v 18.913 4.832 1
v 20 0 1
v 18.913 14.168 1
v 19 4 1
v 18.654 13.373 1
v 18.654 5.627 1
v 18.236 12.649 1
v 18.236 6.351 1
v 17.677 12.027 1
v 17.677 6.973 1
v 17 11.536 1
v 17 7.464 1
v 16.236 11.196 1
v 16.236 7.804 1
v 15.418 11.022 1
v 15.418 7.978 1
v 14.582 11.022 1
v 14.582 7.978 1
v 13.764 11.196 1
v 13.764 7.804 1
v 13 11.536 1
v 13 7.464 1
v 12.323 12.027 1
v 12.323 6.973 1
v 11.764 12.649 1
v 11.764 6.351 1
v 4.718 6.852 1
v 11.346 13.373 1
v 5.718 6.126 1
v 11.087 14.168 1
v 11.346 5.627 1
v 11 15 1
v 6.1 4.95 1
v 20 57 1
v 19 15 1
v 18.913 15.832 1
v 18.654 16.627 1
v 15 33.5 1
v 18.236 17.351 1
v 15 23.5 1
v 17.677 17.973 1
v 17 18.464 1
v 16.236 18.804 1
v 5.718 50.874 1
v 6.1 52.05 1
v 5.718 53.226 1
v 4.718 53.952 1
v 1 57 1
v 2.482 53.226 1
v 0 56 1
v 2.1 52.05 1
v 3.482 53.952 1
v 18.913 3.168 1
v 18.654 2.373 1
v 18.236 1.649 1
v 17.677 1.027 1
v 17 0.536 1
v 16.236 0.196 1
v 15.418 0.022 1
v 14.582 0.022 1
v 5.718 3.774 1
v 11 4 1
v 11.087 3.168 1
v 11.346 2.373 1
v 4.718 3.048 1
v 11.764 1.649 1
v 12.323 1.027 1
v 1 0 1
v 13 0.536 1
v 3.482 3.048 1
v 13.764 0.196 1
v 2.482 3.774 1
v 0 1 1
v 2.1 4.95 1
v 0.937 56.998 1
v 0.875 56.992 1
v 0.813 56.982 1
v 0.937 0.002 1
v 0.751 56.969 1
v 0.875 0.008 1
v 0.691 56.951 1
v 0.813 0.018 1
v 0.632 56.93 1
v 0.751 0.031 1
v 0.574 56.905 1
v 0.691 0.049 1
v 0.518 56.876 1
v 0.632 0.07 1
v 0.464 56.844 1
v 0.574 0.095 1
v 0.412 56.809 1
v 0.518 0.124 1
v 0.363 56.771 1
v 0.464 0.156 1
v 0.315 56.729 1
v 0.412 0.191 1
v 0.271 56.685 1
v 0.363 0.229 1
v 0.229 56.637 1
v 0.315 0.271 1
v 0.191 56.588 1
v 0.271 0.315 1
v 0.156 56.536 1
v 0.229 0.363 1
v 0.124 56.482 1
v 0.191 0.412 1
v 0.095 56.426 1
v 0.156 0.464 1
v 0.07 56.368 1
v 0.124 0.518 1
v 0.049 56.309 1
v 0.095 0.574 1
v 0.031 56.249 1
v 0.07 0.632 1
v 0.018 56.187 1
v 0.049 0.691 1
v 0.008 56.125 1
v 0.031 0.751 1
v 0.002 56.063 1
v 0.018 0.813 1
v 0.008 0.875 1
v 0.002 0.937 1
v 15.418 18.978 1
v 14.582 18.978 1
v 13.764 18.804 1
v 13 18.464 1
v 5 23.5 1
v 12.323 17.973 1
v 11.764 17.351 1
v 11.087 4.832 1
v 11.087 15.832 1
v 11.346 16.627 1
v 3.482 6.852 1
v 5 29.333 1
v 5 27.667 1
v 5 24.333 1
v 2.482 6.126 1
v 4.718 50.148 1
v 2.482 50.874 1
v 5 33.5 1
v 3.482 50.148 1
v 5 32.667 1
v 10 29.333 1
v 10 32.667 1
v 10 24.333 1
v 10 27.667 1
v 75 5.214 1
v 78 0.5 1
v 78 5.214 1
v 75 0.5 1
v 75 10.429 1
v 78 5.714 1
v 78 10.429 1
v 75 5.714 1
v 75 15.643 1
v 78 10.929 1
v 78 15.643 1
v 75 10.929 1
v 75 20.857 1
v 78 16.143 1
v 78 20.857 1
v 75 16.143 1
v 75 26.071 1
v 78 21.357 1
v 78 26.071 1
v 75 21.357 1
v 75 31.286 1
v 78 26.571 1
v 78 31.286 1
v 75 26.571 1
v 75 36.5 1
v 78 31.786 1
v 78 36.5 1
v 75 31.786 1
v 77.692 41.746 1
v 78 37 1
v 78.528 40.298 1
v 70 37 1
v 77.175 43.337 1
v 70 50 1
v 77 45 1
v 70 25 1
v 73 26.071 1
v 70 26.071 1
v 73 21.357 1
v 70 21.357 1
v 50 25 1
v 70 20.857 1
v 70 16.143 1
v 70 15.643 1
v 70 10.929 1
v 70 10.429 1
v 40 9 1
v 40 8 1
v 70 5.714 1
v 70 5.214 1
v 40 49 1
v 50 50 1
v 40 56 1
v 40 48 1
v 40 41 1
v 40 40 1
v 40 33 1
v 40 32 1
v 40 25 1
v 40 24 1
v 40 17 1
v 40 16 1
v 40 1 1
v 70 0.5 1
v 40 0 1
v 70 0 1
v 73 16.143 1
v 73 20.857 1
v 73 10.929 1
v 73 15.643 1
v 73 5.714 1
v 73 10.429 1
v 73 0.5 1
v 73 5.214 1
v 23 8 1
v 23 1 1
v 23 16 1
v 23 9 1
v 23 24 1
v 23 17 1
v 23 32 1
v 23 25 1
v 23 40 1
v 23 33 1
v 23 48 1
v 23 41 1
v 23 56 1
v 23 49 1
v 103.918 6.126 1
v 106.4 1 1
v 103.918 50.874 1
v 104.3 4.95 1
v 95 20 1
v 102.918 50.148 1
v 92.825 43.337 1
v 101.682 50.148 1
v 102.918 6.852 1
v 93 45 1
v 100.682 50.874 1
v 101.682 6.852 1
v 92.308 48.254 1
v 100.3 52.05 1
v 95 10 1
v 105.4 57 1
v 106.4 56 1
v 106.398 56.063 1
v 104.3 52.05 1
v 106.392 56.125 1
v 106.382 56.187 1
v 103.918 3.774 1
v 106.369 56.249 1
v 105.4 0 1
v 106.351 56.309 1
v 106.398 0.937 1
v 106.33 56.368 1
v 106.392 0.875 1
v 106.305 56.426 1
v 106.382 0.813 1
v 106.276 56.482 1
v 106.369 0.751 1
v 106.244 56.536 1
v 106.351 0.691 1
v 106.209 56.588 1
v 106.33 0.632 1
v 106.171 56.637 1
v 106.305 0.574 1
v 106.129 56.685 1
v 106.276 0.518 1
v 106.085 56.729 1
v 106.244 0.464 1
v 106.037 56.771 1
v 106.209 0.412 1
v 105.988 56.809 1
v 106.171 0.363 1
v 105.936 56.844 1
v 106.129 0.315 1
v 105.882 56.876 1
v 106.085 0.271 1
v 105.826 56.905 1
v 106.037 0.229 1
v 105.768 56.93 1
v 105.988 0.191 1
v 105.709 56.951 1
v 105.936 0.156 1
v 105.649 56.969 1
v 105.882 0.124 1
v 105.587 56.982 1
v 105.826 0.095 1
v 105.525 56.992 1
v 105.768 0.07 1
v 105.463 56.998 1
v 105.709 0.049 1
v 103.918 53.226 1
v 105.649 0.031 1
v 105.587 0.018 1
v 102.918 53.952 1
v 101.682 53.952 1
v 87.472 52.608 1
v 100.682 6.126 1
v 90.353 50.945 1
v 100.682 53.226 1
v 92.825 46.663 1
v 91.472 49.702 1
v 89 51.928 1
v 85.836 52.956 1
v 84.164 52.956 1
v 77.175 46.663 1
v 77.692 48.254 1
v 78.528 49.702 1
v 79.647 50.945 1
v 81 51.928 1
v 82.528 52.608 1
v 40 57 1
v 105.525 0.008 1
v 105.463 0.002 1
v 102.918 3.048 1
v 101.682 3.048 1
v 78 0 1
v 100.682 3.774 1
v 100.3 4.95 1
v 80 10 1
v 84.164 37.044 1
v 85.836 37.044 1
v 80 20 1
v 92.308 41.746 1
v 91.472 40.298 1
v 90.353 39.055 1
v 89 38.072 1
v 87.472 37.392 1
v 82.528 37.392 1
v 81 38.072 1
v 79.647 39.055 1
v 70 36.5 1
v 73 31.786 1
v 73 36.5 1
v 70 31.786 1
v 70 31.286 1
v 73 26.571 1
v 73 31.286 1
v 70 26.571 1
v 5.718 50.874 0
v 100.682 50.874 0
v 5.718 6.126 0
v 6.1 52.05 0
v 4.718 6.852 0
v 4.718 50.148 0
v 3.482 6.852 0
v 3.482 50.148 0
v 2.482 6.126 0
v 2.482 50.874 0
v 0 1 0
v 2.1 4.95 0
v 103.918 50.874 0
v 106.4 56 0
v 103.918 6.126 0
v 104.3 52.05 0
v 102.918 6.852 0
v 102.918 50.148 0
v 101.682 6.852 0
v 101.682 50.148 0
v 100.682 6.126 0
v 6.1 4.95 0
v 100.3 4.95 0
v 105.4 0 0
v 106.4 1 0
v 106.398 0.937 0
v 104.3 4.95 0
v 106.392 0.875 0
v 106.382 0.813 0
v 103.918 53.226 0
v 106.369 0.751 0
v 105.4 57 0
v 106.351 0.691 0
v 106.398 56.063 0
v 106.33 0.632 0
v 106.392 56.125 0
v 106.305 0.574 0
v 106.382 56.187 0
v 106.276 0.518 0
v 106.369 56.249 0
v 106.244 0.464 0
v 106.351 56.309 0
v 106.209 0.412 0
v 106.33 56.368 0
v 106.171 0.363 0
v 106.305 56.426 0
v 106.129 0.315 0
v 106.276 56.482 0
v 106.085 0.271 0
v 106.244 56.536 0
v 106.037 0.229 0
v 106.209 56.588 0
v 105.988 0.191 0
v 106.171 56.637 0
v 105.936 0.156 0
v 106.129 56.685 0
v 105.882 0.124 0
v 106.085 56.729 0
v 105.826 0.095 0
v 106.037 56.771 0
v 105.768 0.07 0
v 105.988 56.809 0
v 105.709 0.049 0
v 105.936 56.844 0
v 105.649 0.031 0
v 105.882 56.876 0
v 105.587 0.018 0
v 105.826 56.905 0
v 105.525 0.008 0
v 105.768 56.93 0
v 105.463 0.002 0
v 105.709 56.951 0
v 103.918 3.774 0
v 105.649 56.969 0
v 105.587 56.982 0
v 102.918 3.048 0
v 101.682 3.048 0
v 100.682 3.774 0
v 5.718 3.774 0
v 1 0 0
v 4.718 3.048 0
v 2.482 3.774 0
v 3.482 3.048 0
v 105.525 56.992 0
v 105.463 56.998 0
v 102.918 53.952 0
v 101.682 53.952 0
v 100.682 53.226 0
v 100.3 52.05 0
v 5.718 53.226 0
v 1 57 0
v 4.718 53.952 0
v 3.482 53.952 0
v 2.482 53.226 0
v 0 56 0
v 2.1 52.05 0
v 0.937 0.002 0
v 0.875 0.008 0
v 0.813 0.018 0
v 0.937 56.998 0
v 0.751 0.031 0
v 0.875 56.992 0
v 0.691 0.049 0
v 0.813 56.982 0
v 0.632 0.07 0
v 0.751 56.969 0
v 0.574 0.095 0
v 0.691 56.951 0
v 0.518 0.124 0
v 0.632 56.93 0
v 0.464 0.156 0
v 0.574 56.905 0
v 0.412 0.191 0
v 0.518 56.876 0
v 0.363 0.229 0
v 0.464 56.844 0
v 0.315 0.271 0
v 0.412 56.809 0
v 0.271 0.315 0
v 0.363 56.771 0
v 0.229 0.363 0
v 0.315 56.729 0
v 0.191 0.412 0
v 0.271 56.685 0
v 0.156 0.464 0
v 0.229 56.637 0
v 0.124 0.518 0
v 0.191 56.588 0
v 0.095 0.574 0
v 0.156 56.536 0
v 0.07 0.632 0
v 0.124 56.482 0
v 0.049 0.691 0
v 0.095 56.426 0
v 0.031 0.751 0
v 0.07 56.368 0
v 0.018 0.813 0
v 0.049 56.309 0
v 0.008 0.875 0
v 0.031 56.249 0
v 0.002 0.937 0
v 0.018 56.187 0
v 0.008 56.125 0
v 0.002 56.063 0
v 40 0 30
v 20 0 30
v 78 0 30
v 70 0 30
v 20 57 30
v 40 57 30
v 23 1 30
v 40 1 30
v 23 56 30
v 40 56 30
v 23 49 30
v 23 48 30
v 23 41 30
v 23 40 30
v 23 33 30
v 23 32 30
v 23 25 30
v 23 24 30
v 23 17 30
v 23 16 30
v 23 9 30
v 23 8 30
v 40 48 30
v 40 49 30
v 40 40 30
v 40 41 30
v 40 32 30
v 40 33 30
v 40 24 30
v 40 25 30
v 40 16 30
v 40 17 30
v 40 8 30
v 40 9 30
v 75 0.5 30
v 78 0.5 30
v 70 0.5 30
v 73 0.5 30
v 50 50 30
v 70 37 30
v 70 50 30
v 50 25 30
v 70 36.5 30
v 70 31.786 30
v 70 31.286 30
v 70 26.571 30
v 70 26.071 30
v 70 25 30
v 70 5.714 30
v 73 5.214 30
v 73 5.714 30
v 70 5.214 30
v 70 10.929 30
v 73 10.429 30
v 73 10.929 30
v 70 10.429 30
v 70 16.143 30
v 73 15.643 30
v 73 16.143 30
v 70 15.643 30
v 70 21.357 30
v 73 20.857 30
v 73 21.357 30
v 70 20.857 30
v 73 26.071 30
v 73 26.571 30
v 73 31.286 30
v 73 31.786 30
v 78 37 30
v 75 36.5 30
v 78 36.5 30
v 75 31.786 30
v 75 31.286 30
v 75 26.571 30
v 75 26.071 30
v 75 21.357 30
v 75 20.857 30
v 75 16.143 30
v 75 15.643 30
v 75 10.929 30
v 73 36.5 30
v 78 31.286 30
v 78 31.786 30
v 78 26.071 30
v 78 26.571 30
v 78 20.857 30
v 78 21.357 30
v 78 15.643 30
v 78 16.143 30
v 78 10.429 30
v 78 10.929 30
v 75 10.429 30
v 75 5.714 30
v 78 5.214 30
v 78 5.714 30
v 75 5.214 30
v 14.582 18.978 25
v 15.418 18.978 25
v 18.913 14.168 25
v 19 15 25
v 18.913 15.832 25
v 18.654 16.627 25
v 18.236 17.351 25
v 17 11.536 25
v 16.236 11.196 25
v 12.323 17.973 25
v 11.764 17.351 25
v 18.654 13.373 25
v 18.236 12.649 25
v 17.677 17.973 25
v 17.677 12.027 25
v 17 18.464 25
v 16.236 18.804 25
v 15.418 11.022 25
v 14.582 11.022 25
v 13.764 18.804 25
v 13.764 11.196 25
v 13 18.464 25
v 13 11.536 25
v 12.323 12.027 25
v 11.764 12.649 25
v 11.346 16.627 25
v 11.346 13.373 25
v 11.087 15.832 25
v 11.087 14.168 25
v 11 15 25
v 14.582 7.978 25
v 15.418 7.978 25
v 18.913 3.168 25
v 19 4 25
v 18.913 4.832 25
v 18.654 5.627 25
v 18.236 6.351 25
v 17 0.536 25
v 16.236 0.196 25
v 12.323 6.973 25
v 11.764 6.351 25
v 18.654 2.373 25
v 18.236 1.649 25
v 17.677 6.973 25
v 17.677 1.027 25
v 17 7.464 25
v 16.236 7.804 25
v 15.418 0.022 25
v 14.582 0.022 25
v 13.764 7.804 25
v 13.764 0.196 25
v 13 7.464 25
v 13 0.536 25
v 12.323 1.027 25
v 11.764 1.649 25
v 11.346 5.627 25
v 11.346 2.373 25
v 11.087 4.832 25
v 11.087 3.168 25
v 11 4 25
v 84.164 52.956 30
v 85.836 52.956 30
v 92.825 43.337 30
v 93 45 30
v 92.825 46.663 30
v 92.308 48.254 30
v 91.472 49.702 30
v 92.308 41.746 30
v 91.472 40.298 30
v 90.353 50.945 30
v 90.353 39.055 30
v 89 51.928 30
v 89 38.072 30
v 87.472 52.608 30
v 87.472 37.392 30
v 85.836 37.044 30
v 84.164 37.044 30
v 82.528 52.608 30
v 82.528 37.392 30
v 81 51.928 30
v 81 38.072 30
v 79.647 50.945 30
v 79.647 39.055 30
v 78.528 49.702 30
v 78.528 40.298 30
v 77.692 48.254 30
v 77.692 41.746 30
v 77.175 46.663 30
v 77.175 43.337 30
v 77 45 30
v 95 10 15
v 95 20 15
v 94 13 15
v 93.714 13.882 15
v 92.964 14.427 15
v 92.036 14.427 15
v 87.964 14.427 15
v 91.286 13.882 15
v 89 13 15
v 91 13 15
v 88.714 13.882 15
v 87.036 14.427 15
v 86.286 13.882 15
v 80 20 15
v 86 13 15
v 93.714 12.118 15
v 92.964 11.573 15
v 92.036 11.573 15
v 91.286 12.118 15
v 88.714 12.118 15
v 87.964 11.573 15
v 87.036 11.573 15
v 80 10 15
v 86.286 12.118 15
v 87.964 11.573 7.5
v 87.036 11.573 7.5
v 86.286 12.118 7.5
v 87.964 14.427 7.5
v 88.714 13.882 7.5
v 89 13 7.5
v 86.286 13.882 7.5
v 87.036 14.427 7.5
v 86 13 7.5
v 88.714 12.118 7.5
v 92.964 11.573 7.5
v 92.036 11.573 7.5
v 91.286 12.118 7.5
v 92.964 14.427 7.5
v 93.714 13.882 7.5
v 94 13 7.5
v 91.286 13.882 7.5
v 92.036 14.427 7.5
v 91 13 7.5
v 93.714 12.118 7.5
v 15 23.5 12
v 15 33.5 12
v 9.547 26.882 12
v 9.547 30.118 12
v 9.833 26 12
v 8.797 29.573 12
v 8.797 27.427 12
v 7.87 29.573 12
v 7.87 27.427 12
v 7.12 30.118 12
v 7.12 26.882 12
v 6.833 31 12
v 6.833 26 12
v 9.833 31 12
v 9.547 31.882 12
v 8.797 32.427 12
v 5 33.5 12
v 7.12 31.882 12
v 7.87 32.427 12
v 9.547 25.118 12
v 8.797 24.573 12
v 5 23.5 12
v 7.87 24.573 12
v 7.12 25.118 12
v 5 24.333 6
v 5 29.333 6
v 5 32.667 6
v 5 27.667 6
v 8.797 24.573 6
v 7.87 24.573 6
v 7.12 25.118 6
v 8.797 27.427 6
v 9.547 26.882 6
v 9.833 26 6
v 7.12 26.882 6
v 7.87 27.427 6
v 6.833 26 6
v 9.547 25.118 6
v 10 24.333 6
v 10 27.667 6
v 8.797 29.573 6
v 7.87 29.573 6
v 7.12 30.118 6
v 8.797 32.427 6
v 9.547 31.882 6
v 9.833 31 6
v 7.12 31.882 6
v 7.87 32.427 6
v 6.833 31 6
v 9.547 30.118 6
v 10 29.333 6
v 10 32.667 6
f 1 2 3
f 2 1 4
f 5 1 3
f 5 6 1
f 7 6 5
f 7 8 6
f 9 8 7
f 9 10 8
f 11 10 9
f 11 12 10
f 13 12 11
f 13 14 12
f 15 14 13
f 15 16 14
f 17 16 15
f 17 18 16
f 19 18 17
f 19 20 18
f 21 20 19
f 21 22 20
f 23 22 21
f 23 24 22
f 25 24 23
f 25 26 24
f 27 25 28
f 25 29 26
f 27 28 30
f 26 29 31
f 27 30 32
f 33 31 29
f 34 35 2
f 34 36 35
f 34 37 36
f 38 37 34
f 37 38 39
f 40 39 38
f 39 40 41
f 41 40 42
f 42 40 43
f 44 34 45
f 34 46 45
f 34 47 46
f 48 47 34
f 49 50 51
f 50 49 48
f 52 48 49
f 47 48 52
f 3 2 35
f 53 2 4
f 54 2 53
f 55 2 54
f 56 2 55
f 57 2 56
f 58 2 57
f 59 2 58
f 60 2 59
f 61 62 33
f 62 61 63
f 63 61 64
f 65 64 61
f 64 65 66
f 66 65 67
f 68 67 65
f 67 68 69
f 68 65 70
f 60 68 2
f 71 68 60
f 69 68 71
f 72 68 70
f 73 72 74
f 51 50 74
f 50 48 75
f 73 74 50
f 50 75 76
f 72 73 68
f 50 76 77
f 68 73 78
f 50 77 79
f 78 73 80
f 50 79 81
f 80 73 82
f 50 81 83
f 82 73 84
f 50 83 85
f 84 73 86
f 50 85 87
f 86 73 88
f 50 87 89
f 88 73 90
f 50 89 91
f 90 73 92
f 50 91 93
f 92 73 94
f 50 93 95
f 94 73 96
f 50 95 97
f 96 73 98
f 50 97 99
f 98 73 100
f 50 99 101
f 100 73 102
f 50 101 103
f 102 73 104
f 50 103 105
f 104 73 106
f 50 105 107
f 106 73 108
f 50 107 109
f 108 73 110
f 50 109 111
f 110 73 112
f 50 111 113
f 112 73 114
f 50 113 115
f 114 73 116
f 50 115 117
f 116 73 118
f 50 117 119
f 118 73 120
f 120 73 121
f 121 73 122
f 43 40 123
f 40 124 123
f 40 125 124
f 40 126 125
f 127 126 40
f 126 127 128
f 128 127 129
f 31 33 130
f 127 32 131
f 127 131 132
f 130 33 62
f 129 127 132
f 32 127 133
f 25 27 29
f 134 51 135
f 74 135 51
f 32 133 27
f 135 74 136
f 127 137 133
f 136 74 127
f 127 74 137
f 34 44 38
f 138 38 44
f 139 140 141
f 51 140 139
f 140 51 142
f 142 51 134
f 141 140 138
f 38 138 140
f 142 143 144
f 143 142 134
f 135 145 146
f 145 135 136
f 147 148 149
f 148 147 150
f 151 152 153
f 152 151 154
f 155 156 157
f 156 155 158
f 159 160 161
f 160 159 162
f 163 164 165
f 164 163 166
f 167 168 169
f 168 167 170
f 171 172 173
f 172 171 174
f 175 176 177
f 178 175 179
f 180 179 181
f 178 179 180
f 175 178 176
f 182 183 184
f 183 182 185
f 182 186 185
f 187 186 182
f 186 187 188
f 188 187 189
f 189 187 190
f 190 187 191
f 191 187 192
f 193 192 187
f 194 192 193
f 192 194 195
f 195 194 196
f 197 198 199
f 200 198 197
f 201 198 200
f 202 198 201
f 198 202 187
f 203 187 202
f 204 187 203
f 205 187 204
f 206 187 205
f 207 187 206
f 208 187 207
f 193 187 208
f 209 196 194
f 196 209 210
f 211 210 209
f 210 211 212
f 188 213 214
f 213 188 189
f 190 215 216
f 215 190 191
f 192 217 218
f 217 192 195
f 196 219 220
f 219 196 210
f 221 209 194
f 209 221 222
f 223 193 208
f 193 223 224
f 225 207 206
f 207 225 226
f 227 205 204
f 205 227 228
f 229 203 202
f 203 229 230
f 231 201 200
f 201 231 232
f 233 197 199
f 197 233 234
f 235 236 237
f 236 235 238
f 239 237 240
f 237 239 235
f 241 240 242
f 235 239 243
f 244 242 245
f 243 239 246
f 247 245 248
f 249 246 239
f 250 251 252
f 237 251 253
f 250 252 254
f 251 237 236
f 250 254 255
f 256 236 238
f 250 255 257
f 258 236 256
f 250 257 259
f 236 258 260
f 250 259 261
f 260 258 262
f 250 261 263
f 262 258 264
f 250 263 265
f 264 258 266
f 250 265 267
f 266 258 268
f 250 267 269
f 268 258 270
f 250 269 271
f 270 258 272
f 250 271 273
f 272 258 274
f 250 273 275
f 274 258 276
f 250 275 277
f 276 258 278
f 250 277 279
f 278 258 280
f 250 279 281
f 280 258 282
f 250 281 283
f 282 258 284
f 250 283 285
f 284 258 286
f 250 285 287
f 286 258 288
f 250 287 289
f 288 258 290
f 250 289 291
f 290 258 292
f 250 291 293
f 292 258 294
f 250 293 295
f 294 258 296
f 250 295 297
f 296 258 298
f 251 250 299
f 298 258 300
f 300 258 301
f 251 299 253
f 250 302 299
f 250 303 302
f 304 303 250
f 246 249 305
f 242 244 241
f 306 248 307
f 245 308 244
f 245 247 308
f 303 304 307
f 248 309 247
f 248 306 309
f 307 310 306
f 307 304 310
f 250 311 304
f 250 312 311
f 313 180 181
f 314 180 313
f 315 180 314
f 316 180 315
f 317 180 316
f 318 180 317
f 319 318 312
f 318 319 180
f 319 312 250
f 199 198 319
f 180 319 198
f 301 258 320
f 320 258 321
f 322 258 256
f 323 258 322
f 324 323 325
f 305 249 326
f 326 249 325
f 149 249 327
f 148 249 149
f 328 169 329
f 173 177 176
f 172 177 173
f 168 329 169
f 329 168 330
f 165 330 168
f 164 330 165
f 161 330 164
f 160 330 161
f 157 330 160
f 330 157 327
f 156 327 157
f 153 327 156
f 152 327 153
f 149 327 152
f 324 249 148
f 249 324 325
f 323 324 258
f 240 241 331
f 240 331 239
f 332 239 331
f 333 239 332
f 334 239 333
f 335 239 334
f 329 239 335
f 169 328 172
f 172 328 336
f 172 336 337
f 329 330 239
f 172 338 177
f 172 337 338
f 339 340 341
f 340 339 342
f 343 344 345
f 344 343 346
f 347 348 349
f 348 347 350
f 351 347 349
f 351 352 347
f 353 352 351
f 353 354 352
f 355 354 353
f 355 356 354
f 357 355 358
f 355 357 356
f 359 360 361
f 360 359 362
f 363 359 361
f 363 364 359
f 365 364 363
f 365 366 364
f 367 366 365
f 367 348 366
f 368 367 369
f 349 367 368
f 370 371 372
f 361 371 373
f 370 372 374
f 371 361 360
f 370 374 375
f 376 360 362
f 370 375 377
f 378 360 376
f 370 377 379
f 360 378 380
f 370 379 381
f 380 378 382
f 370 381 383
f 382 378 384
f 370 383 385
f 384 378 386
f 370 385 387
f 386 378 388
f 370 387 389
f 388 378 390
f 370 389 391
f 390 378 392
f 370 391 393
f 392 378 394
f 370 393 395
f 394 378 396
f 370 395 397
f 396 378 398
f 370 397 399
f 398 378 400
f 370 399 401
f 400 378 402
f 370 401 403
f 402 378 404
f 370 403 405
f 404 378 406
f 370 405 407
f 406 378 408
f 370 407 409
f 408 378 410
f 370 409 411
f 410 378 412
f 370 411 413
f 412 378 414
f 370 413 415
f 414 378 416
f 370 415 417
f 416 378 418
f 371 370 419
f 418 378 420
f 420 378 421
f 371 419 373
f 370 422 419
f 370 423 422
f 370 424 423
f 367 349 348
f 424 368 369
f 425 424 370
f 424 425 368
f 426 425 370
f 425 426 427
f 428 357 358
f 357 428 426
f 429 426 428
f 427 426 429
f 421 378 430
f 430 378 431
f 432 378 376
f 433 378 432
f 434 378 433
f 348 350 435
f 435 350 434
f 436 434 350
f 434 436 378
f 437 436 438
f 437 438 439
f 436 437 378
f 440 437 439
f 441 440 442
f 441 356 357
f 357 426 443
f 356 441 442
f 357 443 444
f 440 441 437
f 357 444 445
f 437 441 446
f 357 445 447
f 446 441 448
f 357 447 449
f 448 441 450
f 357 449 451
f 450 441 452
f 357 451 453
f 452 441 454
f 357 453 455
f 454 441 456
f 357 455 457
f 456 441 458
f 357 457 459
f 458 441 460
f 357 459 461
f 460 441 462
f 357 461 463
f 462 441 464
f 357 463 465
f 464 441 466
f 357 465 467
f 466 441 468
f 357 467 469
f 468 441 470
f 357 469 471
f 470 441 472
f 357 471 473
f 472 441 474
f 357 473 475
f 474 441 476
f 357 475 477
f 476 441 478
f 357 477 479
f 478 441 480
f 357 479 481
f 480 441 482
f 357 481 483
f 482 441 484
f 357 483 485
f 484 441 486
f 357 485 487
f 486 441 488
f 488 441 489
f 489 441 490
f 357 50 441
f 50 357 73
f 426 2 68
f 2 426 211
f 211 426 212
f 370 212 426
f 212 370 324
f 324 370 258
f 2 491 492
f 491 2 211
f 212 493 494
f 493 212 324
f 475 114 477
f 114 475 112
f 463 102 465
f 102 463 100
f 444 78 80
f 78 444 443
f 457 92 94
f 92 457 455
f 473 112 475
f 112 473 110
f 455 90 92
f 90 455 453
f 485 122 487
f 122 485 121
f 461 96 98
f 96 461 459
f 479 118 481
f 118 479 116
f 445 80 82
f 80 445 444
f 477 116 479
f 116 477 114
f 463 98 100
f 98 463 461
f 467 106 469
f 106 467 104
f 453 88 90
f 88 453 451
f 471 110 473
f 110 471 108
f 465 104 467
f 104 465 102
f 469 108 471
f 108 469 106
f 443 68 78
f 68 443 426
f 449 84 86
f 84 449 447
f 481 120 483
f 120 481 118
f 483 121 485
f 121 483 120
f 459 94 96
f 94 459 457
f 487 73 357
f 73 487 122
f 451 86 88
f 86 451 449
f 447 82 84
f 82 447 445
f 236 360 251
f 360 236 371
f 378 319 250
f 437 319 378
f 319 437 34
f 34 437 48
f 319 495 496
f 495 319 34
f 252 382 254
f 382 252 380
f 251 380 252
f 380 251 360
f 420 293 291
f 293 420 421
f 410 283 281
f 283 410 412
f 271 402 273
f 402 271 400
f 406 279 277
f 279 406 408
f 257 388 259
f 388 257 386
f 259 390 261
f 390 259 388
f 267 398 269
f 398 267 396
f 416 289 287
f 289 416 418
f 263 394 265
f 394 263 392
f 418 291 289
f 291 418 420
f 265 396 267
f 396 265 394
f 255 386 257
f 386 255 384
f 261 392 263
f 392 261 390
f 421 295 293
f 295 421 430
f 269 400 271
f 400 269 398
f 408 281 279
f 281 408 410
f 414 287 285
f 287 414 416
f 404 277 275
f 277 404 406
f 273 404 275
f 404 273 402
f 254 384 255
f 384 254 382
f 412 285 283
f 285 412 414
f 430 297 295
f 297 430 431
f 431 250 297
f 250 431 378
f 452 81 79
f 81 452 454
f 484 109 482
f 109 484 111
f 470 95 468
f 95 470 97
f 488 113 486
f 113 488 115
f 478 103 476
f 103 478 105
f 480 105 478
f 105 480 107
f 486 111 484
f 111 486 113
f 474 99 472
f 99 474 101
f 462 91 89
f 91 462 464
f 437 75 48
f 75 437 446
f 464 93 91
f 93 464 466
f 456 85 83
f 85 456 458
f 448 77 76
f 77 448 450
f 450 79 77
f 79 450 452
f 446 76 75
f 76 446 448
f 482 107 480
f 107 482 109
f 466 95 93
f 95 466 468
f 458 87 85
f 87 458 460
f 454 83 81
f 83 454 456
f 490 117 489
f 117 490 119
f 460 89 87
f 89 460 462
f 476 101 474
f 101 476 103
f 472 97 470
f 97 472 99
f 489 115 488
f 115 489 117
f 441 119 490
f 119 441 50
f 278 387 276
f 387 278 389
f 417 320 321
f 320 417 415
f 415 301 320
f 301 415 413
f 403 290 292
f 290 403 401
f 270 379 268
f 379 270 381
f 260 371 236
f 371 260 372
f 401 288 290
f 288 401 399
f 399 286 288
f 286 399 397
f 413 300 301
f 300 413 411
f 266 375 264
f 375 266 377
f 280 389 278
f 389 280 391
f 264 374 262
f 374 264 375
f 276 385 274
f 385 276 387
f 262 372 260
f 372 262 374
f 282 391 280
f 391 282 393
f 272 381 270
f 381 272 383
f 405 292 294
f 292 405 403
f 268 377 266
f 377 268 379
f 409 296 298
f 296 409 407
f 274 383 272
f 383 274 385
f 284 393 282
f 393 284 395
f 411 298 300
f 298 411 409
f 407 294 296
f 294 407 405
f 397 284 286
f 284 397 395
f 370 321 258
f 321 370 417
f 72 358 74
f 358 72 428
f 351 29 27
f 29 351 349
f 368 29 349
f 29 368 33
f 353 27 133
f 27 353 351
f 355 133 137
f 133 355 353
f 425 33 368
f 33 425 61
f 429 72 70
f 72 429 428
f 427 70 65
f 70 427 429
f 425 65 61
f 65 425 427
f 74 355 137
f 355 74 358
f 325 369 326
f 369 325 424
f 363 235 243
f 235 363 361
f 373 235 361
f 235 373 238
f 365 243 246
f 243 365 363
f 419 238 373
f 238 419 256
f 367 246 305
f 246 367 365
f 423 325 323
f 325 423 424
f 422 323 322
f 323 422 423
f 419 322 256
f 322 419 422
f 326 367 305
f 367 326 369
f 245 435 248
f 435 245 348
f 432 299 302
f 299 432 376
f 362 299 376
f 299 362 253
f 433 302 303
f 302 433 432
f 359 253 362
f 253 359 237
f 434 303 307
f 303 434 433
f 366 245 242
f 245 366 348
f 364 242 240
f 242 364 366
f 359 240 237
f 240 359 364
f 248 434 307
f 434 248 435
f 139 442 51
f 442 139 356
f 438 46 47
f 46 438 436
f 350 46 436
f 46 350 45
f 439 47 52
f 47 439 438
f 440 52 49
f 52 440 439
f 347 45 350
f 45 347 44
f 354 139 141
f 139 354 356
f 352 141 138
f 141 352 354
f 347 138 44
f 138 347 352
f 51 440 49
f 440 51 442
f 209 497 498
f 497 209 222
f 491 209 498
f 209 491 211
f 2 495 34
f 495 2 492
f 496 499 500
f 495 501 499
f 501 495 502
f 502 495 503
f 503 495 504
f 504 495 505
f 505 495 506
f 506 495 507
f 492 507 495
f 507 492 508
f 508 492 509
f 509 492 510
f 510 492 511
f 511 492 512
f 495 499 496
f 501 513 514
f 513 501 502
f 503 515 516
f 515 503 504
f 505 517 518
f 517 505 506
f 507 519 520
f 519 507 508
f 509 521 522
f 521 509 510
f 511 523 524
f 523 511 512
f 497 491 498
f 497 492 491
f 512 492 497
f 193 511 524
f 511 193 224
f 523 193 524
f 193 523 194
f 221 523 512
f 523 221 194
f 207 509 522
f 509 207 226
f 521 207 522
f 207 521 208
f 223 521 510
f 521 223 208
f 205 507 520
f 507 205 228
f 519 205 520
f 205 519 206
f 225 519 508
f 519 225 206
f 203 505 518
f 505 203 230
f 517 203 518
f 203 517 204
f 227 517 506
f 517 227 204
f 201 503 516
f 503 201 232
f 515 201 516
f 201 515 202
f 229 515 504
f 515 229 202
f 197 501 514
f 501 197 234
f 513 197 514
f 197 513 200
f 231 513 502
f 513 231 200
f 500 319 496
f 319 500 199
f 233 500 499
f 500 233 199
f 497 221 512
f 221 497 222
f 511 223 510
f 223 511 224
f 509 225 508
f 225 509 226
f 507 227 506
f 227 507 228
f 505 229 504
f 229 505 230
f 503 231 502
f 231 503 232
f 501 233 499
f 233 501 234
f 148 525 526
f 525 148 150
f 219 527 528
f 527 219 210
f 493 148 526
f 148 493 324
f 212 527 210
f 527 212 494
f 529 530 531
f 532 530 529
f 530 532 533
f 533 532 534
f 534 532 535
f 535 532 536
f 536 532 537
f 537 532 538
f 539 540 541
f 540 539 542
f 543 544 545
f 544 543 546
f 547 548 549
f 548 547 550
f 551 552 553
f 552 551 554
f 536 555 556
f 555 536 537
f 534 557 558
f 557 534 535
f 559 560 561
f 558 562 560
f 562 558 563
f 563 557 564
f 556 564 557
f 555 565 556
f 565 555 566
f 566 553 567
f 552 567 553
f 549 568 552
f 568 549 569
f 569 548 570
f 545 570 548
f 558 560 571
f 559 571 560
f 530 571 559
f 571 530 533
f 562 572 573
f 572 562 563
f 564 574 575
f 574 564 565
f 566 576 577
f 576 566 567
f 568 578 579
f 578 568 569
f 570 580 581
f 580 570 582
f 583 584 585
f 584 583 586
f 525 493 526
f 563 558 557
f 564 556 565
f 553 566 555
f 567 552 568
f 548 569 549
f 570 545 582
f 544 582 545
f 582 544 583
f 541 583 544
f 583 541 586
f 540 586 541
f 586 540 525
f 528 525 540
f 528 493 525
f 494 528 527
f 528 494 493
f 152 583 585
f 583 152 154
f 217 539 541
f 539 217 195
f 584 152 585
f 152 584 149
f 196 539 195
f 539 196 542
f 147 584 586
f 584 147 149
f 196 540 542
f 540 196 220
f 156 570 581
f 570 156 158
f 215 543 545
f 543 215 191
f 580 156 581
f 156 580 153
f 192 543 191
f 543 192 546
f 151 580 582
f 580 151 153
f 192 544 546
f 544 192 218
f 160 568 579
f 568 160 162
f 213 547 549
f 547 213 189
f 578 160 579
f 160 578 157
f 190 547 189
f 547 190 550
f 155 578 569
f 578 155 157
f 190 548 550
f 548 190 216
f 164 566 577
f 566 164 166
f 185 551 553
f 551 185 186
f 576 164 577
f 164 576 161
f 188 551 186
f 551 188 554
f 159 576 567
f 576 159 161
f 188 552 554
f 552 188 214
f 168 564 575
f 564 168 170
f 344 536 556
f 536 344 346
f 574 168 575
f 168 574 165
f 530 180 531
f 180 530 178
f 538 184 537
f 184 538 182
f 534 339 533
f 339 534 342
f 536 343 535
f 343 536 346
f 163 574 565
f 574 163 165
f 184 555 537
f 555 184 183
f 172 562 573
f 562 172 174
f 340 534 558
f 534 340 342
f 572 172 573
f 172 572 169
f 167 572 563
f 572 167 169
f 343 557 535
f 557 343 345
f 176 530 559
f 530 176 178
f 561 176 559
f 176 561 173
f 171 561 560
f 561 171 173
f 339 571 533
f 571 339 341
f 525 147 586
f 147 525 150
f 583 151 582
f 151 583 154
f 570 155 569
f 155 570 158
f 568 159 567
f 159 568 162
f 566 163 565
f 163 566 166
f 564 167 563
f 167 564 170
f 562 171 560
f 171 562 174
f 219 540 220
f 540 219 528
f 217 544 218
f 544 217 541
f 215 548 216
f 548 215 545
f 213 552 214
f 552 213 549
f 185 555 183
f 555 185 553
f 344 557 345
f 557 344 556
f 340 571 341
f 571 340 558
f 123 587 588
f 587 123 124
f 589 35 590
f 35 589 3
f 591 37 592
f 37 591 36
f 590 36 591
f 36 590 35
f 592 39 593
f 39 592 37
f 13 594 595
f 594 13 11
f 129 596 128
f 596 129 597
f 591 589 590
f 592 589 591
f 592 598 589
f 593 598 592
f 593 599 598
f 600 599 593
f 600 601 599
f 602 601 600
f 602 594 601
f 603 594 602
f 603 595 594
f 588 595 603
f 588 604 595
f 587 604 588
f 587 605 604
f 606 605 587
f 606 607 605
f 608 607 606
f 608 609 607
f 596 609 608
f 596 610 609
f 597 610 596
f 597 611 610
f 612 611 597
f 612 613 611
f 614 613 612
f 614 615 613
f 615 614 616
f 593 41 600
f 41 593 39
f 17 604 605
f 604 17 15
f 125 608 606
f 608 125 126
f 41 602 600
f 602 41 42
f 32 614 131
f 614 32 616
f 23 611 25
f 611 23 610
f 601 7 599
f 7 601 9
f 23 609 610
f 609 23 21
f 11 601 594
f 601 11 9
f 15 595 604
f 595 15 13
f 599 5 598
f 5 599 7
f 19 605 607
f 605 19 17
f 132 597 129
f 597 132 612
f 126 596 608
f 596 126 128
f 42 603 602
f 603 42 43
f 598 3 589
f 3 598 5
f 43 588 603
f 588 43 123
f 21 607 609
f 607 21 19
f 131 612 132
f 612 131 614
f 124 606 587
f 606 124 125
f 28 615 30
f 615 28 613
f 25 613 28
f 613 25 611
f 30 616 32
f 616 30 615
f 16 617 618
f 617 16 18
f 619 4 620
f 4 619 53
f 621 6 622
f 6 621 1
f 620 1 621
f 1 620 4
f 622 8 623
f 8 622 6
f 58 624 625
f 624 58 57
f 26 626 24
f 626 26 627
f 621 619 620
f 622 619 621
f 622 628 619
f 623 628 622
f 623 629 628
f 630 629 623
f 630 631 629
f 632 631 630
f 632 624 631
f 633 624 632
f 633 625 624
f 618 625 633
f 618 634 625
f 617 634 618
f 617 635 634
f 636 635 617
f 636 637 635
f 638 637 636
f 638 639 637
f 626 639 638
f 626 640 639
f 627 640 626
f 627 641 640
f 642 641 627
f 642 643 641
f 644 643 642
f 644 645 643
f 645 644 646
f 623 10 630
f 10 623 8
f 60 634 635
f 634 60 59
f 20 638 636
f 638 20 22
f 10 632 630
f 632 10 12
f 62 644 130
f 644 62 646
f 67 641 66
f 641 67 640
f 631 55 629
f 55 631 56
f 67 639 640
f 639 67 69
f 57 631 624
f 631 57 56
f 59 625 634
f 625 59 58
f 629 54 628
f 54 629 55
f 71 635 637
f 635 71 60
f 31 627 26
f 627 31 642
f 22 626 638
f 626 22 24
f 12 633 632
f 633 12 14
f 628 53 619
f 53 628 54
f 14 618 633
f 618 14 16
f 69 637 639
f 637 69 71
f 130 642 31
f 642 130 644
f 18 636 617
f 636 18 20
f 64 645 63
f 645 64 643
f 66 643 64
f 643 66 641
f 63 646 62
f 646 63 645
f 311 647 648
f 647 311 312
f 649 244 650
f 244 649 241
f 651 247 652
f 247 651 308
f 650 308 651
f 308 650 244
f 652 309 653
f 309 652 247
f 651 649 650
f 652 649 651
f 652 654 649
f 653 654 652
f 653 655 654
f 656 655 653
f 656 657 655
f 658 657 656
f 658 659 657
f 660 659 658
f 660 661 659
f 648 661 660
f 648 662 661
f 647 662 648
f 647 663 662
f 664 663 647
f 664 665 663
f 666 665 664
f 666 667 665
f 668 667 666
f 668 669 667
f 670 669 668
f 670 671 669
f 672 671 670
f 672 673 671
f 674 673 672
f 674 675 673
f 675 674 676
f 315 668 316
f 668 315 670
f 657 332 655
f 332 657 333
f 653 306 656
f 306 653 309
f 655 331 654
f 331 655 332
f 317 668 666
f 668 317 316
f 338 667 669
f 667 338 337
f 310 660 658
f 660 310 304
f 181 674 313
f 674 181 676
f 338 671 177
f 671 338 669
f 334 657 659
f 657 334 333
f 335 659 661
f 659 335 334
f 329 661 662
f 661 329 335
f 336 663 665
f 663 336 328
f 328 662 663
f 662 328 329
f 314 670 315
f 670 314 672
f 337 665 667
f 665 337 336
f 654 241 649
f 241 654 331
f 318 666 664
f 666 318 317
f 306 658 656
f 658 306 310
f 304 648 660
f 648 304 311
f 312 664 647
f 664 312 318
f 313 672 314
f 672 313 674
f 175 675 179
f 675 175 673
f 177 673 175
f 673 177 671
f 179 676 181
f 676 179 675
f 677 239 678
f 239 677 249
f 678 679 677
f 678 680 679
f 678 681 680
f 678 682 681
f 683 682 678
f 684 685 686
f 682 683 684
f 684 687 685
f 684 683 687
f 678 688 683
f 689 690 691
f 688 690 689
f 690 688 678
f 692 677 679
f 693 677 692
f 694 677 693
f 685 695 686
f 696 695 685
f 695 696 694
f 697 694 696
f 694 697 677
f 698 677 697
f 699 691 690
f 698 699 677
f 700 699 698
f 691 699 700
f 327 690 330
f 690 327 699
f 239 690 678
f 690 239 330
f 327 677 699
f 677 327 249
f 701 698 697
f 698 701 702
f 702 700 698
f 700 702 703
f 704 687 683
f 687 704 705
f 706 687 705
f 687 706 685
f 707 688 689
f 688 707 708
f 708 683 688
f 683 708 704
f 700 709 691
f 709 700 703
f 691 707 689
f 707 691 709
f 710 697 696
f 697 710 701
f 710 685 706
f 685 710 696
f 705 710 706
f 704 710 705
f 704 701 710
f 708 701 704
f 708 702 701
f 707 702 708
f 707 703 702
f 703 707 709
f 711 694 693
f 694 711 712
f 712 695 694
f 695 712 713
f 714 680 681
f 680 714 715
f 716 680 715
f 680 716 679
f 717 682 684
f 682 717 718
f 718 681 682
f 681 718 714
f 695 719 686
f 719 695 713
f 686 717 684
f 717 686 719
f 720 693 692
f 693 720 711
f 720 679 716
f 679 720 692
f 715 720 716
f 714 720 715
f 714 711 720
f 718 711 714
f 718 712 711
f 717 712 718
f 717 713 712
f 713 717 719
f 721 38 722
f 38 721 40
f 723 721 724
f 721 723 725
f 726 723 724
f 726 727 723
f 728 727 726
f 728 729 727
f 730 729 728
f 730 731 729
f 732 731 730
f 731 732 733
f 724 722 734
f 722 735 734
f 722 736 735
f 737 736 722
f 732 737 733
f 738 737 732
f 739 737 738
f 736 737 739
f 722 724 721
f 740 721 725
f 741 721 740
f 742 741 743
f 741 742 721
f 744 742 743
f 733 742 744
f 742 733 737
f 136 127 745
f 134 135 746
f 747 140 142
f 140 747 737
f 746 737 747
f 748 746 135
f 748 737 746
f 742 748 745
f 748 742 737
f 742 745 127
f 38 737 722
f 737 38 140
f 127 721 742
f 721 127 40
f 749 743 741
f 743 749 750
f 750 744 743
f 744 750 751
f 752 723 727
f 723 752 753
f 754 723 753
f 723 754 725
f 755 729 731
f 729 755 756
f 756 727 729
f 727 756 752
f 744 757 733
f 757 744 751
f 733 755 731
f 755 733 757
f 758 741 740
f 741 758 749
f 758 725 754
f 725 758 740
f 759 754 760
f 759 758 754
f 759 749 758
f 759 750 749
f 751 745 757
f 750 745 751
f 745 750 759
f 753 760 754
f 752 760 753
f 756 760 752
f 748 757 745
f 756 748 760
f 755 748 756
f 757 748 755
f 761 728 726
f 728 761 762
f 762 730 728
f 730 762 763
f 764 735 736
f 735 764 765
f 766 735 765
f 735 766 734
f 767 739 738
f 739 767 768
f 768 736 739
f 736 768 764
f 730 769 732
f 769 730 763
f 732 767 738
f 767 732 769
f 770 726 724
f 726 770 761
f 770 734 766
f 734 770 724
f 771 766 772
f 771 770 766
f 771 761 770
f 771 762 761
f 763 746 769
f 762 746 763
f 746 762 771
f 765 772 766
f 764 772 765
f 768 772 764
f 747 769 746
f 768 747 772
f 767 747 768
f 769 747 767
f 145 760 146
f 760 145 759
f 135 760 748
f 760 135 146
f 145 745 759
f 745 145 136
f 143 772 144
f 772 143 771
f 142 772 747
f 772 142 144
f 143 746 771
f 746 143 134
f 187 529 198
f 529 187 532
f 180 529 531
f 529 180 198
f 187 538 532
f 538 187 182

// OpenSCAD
// file: include.scad
module rounded_cuboid(dimensions, CORNER_R) {
    
    MB_L = dimensions[0];
    MB_W = dimensions[1];
    MB_H = dimensions[2];
    
    difference() {
        
        // main cube body
        cube([MB_L, MB_W, MB_H]);
        
        // for each corner - remove triangled piece
        for (coord_pair = [
                        [[0, 0, 0],                             [CORNER_R,CORNER_R,0]],
                        [[MB_L - CORNER_R, MB_W - CORNER_R, 0], [MB_L - CORNER_R, MB_W - CORNER_R, 0]],
                        [[0, MB_W - CORNER_R, 0],               [CORNER_R, MB_W - CORNER_R ,0]],
                        [[MB_L - CORNER_R, 0, 0],               [MB_L - CORNER_R, CORNER_R, 0]]
            ]) {
            // triangled piece - is difference between cube and cylinder
            difference() {
                translate(coord_pair[0]) {
                    cube([CORNER_R, CORNER_R, MB_H]);
                }
                translate(coord_pair[1]) {
                    cylinder(h = MB_H, r = CORNER_R, $fn=50);
                }
            }
        }
    }
}
// main file
use <include.scad>

OVERLAP = 1.0;

// board dimensions
MB_L = 106.4;
MB_W = 57.0;
MB_H = 1.0;

SCREW_DISTANCE_X = 98.2;
SCREW_DISTANCE_Y = 47.1;

module acdc_base() {
    
    CORNER_R = 1.0;     // rounded corners radius
    
    // screw holes
    SCREW_SHIFT_X = (MB_L - SCREW_DISTANCE_X) / 2;
    SCREW_SHIFT_Y = (MB_W - SCREW_DISTANCE_Y) / 2;
    SCREW_HOLE_R = 2.0; // radius of screw holes - centered on rounded corners centers
    
    difference() {
        rounded_cuboid([MB_L, MB_W, MB_H], CORNER_R);
        translate([SCREW_SHIFT_X, SCREW_SHIFT_Y,0])               { cylinder(h = MB_H + OVERLAP, r = SCREW_HOLE_R, $fn = 10); }
        translate([MB_L - SCREW_SHIFT_X, SCREW_SHIFT_Y,0])        { cylinder(h = MB_H + OVERLAP, r = SCREW_HOLE_R, $fn = 10); }
        translate([MB_L - SCREW_SHIFT_X, MB_W - SCREW_SHIFT_Y,0]) { cylinder(h = MB_H + OVERLAP, r = SCREW_HOLE_R, $fn = 10); }
        translate([SCREW_SHIFT_X, MB_W - SCREW_SHIFT_Y,0])        { cylinder(h = MB_H + OVERLAP, r = SCREW_HOLE_R, $fn = 10); }
    }

}

module radiator_1() {
    
    // base
    RAD_BASE_L = MB_W;
    RAD_BASE_W = 30.0;
    RAD_BASE_H = 3.0;
    
    cube([RAD_BASE_L, RAD_BASE_W, RAD_BASE_H]);
    
    RAD_ELEM_L = 1.0;
    RAD_ELEM_W = RAD_BASE_W;
    RAD_ELEM_H = 20.0;
    RAD_ELEM_NUMB = 7;
    
    for (x_shift = [0 : (RAD_BASE_L-RAD_ELEM_L) / RAD_ELEM_NUMB : RAD_BASE_L]) {
        translate([x_shift, 0, 0]) {cube([RAD_ELEM_L, RAD_ELEM_W, RAD_ELEM_H]);}
    }
    
}

module radiator_2() {
    
    // base
    RAD_BASE_L = MB_W - 20.0;
    RAD_BASE_W = 30.0;
    RAD_BASE_H = 2.0;
    
    RAD_ELEM_L = 0.5;
    RAD_ELEM_W = RAD_BASE_W;
    RAD_ELEM_H = 8.0;
    RAD_ELEM_NUMB = 7;

    
    translate([0, 0, (RAD_ELEM_H - RAD_BASE_H )/ 2]) { cube([RAD_BASE_L, RAD_BASE_W, RAD_BASE_H]); }
    
    for (x_shift = [0 : (RAD_BASE_L-RAD_ELEM_L) / RAD_ELEM_NUMB : RAD_BASE_L]) {
        translate([x_shift, 0, 0]) {cube([RAD_ELEM_L, RAD_ELEM_W, RAD_ELEM_H]);}
    }
    
}

module conds() {
    
    COND_R_1 = 4.0;
    COND_H_1 = 25.0;
    X_Y_COORDS_1 = [
        [15.0, 15.0],
        [15.0, 4.0],
    ];
    for (coord = X_Y_COORDS_1) {
        translate([coord[0], coord[1], 0]) { cylinder(r = COND_R_1, h = COND_H_1, $fn=30);}
    }
    
    COND_R = 8.0;
    COND_H = 30.0;
    X_Y_COORDS = [
        [85.0, 45.0],
    ];
    for (coord = X_Y_COORDS) {
        translate([coord[0], coord[1], 0]) { cylinder(r = COND_R, h = COND_H, $fn=30);}
    }


}

module transformer() {
    TRANS_L = 20.0;
    TRANS_W = 25.0;
    TRANS_H = 30.0;
    cube([TRANS_L, TRANS_W, TRANS_H]);
}

module inlet_110v() {
    
    BODY_L = 15.0;
    BODY_W = 10.0;
    BODY_H = 15.0;
    
    HOLE_R = 1.5;
    HOLE_H = BODY_H * (2/3);
    
    HOLE_SHIFT_Y = 3.0;
    HOLE_SHIFT_Z = BODY_H / 2;
    
    difference() {
        cube([BODY_L, BODY_W, BODY_H]);
        translate([BODY_L * (3/6), HOLE_SHIFT_Y, HOLE_SHIFT_Z]) {
            cylinder(h = HOLE_H, r = HOLE_R, $fn = 10);
        }
        translate([BODY_L * (5/6), HOLE_SHIFT_Y, HOLE_SHIFT_Z]) {
            cylinder(h = HOLE_H, r = HOLE_R, $fn = 10);
        }
    }
    
}

module outlet_12v() {
    
    BODY_L = 10.0;
    BODY_W = 10.0;
    BODY_H = 12.0;
    
    HOLE_R = 1.5;
    HOLE_H = BODY_H * (2/3);

    HOLE_SHIFT_Z = BODY_H / 2;
    
    difference() {
        cube([BODY_L, BODY_W, BODY_H]);
        translate([BODY_L * (1/3), BODY_W * (1/4), HOLE_SHIFT_Z]) {
            cylinder(h = HOLE_H, r = HOLE_R, $fn = 10);
        }
        translate([BODY_L * (1/3), BODY_W * (3/4), HOLE_SHIFT_Z]) {
            cylinder(h = HOLE_H, r = HOLE_R, $fn = 10);
        }
        
        translate([0, BODY_W * (1/12), 0]) {
            cube([BODY_L / 2, BODY_W / 3, BODY_H / 2]);
        }
        translate([0, BODY_W * (7/12), 0]) {
            cube([BODY_L / 2, BODY_W / 3, BODY_H / 2]);
        }

    }
    
}


module acdc() {
    
    acdc_base();
    
    translate([20.0, 0, 0]) {
    rotate([0, 90.0 ,0]) { 
    rotate([0, 0, 90.0]) {
            radiator_1();
    }}}
    
    translate([70.0, 0, 0]) {
    rotate([0, 90 ,0]) { 
    rotate([0, 0, 90]) {
            radiator_2();
    }}}

    conds();

    translate([50.0, 25.0, 0]) {
        transformer();
    }
    
    
    translate([80.0, 10.0, 0]) {
        inlet_110v();
    }
    
    translate([5.0, (MB_W - 10.0) / 2, 0]) {
        outlet_12v();
    }
}


acdc();
